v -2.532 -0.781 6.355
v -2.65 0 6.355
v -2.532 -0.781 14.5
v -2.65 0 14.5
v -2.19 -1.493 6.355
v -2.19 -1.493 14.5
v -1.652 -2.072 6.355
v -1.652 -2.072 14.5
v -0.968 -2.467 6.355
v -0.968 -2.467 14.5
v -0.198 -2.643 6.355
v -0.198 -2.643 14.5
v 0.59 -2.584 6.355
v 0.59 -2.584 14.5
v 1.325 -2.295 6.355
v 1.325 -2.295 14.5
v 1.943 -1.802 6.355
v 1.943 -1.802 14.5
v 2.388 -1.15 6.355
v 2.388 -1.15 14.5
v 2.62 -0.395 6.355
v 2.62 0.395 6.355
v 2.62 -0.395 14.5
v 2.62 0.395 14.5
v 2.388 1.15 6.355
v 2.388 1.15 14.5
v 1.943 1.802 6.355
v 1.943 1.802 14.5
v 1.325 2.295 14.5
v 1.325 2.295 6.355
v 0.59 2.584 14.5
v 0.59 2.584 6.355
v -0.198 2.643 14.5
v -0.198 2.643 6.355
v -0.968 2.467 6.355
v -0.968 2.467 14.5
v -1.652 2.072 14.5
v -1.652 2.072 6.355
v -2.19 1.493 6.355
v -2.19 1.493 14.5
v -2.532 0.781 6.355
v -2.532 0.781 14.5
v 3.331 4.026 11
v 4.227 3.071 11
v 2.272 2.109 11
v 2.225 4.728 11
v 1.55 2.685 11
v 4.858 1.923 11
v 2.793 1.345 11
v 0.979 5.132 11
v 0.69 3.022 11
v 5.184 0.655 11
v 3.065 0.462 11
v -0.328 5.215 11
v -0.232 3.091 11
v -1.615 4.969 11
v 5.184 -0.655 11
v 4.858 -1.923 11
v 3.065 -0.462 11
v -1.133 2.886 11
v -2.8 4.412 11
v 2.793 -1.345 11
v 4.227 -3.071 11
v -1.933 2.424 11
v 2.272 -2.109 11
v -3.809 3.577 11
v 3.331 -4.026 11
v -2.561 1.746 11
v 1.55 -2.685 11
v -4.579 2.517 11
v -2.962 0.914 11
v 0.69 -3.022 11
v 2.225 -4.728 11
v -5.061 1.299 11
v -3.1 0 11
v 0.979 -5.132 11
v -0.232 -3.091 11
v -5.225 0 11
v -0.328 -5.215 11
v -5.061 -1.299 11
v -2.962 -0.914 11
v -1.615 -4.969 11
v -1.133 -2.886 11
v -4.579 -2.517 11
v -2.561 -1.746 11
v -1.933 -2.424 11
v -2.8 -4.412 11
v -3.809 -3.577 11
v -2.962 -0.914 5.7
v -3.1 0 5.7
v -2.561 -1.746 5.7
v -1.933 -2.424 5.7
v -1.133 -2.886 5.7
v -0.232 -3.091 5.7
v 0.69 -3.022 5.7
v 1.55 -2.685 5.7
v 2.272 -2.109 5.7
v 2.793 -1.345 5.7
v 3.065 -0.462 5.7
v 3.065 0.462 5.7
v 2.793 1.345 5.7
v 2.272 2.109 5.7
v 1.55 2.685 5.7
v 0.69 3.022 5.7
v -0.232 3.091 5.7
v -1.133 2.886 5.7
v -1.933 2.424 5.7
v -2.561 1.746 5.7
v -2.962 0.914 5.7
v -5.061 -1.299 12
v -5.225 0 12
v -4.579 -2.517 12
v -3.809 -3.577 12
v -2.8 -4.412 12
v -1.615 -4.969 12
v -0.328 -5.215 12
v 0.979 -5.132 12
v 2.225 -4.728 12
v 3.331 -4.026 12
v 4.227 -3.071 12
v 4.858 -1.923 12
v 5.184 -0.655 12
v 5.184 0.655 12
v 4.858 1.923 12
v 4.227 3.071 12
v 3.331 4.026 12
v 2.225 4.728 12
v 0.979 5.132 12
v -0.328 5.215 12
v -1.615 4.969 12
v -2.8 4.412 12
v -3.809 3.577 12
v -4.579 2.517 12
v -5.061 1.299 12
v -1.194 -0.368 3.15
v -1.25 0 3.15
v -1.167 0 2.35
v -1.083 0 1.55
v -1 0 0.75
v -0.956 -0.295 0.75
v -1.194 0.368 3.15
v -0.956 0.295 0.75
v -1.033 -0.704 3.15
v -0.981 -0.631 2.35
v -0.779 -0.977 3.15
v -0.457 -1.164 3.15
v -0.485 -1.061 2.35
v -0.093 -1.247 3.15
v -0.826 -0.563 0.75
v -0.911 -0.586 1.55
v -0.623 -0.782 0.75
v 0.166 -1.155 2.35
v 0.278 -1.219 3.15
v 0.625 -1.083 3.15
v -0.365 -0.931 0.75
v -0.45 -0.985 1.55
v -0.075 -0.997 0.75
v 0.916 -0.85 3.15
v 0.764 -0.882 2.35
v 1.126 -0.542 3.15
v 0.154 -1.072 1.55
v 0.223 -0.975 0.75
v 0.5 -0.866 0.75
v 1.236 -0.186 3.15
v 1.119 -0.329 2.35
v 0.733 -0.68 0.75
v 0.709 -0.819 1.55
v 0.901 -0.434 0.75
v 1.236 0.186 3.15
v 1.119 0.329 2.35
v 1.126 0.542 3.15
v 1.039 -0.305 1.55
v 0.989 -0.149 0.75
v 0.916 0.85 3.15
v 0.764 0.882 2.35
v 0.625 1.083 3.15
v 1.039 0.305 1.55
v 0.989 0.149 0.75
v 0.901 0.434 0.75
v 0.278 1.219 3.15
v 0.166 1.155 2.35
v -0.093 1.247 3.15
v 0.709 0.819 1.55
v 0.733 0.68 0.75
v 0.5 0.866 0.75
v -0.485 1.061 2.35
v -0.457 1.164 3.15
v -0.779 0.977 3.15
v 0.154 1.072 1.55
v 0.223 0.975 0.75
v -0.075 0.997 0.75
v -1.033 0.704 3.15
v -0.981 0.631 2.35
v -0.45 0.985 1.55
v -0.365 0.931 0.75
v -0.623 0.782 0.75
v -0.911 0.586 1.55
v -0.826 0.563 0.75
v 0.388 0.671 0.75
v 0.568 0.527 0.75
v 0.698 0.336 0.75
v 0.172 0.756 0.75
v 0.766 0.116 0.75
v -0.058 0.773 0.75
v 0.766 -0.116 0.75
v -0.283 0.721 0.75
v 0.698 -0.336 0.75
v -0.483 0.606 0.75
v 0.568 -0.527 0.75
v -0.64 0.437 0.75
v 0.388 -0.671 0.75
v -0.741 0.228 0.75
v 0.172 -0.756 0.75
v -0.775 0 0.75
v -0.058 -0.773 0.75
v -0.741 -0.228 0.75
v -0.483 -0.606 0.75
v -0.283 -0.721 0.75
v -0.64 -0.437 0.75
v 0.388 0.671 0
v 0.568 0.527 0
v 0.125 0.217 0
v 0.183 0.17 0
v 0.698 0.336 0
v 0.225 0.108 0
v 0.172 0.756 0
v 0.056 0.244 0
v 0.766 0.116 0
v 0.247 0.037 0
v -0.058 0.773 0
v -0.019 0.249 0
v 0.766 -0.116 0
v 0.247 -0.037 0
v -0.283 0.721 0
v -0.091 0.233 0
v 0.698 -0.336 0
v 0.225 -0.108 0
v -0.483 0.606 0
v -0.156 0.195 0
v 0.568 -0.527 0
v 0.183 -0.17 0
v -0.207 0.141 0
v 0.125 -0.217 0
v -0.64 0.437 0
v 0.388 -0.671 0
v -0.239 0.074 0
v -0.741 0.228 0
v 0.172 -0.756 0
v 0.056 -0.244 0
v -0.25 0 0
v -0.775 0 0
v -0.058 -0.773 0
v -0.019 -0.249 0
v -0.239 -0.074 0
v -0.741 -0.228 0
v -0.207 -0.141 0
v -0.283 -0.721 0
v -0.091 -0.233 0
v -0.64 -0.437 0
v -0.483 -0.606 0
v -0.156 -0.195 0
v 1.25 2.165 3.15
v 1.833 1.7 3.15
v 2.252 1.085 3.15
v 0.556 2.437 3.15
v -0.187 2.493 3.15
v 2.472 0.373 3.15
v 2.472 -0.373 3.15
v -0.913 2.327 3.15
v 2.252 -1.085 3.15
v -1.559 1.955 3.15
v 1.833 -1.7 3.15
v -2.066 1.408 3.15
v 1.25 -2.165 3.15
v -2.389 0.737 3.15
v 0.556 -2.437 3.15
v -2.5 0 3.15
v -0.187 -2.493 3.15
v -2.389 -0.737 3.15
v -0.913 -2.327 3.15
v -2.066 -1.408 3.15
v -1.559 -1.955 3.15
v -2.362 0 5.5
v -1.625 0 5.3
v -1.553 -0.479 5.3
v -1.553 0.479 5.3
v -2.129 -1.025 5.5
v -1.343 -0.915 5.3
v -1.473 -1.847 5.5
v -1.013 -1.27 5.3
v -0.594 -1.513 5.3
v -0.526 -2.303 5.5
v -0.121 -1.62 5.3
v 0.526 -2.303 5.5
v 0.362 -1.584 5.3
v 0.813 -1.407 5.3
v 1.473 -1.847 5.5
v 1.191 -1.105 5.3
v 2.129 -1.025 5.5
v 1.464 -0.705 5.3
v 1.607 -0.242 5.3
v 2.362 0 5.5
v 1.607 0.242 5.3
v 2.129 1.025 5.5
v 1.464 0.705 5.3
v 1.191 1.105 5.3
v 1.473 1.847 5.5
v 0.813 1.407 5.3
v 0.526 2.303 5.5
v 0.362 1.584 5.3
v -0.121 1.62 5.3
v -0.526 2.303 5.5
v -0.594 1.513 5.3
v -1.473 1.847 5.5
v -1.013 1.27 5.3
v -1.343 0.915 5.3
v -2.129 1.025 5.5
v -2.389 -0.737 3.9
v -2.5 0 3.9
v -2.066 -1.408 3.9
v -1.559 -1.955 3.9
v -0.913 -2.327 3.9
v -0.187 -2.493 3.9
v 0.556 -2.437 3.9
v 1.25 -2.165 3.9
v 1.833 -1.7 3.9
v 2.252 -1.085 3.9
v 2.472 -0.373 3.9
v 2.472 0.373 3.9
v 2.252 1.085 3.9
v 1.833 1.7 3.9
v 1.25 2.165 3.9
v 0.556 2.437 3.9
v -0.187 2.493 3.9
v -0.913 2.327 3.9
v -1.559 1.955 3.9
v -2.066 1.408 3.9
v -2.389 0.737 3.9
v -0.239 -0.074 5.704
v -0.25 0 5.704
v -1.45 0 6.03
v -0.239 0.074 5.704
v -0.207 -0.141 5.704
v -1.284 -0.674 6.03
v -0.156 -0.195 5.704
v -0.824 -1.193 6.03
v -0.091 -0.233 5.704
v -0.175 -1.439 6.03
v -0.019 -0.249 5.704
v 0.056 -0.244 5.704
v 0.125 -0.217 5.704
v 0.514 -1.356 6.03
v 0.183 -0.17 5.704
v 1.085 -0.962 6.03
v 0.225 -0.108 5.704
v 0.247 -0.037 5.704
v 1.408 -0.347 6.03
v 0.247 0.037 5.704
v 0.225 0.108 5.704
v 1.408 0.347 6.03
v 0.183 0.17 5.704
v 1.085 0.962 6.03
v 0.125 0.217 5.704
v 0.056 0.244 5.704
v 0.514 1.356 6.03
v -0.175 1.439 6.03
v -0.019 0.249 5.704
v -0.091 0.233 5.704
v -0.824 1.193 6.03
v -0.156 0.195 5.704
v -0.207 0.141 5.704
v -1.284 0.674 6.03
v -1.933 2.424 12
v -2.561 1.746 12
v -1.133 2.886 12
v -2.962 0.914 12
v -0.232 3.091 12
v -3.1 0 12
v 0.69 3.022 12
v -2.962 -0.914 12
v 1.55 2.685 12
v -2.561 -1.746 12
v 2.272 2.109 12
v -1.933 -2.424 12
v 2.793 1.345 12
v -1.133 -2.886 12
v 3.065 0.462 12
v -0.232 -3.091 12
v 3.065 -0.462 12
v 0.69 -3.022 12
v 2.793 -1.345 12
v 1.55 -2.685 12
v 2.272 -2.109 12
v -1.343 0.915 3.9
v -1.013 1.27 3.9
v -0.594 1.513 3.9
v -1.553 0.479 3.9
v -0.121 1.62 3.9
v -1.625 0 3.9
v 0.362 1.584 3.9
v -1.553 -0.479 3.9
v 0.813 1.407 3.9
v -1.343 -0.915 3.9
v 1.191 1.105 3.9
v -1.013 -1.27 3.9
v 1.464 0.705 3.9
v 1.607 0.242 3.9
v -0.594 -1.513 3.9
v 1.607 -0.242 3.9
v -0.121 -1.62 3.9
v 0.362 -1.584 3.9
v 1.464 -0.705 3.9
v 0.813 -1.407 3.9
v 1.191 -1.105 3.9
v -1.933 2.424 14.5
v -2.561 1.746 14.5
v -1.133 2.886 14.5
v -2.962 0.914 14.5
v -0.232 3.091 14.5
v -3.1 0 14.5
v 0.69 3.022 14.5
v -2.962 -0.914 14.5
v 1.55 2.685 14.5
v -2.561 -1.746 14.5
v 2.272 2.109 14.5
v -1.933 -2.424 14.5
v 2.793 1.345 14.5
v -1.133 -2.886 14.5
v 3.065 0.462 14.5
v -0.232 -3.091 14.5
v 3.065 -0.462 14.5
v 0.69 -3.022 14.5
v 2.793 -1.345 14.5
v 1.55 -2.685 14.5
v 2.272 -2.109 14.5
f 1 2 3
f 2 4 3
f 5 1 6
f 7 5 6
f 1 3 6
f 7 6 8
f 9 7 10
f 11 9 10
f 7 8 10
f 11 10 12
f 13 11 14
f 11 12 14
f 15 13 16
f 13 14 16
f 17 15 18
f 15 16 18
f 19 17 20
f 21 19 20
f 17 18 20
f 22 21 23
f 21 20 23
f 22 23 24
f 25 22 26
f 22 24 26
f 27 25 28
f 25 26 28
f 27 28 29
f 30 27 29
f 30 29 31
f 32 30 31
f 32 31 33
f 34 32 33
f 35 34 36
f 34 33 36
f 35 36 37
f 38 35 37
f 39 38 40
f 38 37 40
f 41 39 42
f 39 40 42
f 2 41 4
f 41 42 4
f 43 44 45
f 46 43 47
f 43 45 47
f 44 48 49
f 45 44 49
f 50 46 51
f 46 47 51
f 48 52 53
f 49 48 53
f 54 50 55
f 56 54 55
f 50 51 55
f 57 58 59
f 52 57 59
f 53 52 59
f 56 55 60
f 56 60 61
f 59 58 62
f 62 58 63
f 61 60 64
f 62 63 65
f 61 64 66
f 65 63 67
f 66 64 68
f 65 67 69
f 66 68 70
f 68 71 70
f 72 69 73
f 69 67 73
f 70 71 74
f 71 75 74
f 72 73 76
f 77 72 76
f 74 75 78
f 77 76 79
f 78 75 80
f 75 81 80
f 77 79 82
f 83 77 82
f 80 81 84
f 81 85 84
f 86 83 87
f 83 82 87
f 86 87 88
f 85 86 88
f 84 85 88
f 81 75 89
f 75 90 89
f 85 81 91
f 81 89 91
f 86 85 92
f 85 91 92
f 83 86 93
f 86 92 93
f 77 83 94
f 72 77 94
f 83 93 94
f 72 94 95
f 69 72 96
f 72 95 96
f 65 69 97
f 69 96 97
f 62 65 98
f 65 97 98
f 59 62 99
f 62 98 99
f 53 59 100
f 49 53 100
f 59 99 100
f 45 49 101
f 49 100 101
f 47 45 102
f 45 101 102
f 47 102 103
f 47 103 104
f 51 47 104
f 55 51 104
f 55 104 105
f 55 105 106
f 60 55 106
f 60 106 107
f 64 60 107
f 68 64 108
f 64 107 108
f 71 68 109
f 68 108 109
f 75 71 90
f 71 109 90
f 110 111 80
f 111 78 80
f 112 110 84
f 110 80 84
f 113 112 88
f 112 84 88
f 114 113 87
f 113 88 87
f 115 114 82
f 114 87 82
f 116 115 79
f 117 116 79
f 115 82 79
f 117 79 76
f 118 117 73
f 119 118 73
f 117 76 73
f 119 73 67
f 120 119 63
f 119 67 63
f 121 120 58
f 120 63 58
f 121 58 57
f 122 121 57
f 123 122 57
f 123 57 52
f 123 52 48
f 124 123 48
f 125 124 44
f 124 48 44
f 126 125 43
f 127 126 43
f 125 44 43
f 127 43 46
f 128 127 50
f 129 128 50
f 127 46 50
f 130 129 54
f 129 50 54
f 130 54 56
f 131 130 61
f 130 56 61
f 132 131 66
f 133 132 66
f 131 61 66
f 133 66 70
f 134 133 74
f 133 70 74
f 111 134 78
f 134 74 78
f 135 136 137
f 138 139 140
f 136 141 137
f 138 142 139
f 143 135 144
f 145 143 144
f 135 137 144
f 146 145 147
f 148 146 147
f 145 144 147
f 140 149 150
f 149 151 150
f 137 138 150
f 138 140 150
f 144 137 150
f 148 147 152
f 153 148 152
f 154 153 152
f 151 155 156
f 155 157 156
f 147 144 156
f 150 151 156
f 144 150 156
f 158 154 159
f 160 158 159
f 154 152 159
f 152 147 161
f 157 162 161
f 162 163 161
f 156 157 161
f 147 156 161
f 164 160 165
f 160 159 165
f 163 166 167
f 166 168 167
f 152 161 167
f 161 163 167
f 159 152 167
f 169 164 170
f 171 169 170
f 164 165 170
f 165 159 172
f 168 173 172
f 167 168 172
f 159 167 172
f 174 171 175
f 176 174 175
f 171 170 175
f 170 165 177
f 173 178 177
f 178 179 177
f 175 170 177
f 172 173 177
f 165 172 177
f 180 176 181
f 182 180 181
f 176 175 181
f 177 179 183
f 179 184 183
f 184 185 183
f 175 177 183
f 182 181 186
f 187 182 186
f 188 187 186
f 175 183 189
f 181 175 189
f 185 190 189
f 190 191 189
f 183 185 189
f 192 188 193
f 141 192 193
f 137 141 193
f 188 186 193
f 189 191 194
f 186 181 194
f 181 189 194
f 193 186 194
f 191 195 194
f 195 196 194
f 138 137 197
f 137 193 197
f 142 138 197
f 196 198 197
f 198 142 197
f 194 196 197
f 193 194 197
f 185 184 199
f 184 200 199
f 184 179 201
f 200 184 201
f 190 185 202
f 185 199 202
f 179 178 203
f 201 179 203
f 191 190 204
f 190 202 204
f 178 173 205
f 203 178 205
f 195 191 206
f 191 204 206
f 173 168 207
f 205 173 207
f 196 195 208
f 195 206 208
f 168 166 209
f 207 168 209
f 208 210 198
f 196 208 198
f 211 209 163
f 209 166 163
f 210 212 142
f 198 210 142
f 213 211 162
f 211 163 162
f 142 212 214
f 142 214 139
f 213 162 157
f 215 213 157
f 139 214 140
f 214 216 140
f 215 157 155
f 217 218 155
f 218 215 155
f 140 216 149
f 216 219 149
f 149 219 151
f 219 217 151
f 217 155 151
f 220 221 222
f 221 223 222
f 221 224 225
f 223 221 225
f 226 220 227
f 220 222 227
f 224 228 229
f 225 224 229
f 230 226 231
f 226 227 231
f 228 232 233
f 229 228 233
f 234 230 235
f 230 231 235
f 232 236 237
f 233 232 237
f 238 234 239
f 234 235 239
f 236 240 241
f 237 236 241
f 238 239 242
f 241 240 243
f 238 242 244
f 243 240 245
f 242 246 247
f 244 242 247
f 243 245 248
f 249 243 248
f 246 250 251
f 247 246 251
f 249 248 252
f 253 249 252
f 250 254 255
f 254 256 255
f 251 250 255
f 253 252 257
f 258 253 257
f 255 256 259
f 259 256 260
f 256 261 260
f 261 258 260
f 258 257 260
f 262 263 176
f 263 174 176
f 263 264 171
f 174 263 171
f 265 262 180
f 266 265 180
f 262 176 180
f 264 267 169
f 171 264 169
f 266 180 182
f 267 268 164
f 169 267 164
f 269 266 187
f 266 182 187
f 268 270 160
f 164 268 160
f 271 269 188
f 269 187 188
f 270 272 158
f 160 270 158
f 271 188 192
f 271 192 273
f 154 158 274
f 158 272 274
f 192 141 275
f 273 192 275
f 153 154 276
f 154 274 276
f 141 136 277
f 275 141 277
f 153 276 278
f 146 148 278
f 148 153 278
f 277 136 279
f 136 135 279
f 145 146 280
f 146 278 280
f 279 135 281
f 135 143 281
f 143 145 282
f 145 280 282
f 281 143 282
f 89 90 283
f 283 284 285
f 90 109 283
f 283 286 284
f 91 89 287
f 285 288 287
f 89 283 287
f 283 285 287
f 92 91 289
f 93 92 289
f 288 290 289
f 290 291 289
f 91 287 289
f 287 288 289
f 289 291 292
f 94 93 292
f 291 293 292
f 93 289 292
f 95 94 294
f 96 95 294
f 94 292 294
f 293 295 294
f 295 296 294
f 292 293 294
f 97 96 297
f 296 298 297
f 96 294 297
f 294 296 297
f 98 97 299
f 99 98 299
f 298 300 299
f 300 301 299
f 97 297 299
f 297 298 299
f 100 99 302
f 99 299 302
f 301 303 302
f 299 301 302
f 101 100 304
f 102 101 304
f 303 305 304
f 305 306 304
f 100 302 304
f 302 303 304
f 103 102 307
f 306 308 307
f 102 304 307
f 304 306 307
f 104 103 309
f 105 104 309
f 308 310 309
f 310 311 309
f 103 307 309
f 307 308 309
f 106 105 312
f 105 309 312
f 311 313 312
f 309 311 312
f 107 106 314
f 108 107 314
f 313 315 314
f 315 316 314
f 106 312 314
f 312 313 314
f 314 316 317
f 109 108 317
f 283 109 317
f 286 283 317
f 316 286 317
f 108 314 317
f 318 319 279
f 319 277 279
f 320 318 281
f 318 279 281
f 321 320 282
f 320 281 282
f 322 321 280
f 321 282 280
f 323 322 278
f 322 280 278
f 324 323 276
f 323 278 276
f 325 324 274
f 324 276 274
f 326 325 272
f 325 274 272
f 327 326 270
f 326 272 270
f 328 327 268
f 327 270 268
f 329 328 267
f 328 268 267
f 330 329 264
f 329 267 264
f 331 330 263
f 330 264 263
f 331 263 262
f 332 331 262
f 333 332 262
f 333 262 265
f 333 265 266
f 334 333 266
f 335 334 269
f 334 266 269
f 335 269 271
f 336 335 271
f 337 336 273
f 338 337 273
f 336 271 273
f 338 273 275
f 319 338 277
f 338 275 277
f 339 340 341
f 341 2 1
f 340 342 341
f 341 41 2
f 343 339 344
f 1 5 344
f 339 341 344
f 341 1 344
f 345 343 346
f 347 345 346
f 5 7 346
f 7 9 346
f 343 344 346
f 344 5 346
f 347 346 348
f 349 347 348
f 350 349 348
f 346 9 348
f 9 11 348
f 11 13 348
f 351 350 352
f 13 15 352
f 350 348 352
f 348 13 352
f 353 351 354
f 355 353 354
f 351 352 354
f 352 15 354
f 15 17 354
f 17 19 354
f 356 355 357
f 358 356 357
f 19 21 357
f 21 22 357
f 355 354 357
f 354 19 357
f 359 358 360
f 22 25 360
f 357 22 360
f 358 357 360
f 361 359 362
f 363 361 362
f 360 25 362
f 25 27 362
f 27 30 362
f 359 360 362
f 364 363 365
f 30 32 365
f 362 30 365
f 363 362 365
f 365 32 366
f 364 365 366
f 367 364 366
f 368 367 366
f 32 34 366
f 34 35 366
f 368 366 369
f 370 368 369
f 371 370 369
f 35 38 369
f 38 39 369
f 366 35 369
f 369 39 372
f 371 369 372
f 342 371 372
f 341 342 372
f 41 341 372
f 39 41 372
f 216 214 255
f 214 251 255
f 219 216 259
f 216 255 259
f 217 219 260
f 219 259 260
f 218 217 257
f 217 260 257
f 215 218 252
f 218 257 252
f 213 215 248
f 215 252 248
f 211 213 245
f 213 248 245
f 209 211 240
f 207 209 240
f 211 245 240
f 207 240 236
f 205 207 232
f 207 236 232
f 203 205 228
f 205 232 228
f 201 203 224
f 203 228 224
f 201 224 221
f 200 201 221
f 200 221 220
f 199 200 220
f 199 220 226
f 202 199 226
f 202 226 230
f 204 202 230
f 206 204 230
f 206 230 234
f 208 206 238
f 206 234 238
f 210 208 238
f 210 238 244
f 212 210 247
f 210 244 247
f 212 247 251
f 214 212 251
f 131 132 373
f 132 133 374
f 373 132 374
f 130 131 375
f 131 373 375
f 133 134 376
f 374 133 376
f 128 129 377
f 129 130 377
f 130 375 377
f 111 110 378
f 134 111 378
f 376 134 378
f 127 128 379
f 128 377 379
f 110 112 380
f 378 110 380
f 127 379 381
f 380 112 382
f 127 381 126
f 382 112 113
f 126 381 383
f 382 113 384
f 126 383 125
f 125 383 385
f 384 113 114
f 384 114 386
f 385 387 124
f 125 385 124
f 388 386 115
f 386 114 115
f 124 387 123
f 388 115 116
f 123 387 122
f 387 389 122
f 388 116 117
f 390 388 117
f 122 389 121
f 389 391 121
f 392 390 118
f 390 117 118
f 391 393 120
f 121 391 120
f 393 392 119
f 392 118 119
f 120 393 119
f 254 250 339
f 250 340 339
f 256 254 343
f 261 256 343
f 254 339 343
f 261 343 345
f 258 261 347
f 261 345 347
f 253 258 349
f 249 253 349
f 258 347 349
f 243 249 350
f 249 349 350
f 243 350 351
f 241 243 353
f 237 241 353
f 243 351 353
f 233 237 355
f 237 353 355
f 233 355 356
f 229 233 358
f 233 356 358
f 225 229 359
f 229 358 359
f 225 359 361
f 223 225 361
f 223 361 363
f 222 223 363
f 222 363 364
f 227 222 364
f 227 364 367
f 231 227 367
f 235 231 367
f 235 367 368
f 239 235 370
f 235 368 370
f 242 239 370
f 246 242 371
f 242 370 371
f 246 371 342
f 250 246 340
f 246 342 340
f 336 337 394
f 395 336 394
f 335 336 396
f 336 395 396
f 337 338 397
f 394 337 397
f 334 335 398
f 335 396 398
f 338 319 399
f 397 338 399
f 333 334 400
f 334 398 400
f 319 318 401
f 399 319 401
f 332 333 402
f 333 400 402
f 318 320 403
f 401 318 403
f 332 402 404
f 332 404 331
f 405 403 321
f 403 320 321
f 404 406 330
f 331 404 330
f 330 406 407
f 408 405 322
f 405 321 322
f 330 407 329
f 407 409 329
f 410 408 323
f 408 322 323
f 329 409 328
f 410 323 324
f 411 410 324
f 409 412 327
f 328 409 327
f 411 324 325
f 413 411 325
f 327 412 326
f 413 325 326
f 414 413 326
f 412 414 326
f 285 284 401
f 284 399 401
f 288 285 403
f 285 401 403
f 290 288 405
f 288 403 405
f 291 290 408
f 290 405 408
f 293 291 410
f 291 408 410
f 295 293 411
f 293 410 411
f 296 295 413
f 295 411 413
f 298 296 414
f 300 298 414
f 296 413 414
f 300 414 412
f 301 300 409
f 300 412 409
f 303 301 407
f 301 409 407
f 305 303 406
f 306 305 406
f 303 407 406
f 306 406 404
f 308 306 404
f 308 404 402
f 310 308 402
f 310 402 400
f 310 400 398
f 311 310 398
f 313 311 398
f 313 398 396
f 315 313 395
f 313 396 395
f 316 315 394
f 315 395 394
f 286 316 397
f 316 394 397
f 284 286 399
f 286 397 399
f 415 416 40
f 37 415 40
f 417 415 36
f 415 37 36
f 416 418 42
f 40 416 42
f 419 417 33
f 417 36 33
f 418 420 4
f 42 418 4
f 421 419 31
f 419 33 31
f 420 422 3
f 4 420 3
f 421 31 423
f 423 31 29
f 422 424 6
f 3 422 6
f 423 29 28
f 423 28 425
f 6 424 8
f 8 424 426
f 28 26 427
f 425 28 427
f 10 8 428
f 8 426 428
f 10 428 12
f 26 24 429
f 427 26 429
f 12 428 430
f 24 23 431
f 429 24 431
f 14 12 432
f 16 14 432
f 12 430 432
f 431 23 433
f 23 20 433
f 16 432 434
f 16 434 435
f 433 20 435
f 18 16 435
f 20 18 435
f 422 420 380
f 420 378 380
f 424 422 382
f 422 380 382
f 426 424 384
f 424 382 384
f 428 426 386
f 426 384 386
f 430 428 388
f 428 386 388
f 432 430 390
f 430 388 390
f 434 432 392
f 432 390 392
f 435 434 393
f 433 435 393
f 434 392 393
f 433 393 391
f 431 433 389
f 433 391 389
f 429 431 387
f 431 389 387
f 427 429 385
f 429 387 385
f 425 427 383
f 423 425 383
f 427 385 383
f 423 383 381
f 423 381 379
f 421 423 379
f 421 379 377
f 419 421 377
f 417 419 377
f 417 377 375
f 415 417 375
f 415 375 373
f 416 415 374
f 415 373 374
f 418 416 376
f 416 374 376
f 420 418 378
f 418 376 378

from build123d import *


with BuildPart() as part:
    # Body Sketch → Body Revolve (revolve)
    with BuildSketch(Plane(origin=(0, 0, 0), x_dir=(1, 0, 0), z_dir=(0, 1, 0)), mode=Mode.PRIVATE) as body_revolve_sk:
        Polygon((2.65, -14.5), (3.1, -14.5), (3.1, -12), (5.225, -12), (5.225, -11), (3.1, -11), (3.1, -5.7), (1.625, -5.3), (1.625, -3.9), (2.5, -3.9), (2.5, -3.15), (1.25, -3.15), (1, -0.75), (0.775, -0.75), (0.775, 0), (0.25, 0), (0.25, -5.704207714), (2.65, -6.355055172), align=None)
    revolve(body_revolve_sk.sketch.rotate(Axis((0, 0, 0), (0, 0, 1)), 180), axis=Axis((0, 0, 0), (0, 0, 1)))


solid = part.part
